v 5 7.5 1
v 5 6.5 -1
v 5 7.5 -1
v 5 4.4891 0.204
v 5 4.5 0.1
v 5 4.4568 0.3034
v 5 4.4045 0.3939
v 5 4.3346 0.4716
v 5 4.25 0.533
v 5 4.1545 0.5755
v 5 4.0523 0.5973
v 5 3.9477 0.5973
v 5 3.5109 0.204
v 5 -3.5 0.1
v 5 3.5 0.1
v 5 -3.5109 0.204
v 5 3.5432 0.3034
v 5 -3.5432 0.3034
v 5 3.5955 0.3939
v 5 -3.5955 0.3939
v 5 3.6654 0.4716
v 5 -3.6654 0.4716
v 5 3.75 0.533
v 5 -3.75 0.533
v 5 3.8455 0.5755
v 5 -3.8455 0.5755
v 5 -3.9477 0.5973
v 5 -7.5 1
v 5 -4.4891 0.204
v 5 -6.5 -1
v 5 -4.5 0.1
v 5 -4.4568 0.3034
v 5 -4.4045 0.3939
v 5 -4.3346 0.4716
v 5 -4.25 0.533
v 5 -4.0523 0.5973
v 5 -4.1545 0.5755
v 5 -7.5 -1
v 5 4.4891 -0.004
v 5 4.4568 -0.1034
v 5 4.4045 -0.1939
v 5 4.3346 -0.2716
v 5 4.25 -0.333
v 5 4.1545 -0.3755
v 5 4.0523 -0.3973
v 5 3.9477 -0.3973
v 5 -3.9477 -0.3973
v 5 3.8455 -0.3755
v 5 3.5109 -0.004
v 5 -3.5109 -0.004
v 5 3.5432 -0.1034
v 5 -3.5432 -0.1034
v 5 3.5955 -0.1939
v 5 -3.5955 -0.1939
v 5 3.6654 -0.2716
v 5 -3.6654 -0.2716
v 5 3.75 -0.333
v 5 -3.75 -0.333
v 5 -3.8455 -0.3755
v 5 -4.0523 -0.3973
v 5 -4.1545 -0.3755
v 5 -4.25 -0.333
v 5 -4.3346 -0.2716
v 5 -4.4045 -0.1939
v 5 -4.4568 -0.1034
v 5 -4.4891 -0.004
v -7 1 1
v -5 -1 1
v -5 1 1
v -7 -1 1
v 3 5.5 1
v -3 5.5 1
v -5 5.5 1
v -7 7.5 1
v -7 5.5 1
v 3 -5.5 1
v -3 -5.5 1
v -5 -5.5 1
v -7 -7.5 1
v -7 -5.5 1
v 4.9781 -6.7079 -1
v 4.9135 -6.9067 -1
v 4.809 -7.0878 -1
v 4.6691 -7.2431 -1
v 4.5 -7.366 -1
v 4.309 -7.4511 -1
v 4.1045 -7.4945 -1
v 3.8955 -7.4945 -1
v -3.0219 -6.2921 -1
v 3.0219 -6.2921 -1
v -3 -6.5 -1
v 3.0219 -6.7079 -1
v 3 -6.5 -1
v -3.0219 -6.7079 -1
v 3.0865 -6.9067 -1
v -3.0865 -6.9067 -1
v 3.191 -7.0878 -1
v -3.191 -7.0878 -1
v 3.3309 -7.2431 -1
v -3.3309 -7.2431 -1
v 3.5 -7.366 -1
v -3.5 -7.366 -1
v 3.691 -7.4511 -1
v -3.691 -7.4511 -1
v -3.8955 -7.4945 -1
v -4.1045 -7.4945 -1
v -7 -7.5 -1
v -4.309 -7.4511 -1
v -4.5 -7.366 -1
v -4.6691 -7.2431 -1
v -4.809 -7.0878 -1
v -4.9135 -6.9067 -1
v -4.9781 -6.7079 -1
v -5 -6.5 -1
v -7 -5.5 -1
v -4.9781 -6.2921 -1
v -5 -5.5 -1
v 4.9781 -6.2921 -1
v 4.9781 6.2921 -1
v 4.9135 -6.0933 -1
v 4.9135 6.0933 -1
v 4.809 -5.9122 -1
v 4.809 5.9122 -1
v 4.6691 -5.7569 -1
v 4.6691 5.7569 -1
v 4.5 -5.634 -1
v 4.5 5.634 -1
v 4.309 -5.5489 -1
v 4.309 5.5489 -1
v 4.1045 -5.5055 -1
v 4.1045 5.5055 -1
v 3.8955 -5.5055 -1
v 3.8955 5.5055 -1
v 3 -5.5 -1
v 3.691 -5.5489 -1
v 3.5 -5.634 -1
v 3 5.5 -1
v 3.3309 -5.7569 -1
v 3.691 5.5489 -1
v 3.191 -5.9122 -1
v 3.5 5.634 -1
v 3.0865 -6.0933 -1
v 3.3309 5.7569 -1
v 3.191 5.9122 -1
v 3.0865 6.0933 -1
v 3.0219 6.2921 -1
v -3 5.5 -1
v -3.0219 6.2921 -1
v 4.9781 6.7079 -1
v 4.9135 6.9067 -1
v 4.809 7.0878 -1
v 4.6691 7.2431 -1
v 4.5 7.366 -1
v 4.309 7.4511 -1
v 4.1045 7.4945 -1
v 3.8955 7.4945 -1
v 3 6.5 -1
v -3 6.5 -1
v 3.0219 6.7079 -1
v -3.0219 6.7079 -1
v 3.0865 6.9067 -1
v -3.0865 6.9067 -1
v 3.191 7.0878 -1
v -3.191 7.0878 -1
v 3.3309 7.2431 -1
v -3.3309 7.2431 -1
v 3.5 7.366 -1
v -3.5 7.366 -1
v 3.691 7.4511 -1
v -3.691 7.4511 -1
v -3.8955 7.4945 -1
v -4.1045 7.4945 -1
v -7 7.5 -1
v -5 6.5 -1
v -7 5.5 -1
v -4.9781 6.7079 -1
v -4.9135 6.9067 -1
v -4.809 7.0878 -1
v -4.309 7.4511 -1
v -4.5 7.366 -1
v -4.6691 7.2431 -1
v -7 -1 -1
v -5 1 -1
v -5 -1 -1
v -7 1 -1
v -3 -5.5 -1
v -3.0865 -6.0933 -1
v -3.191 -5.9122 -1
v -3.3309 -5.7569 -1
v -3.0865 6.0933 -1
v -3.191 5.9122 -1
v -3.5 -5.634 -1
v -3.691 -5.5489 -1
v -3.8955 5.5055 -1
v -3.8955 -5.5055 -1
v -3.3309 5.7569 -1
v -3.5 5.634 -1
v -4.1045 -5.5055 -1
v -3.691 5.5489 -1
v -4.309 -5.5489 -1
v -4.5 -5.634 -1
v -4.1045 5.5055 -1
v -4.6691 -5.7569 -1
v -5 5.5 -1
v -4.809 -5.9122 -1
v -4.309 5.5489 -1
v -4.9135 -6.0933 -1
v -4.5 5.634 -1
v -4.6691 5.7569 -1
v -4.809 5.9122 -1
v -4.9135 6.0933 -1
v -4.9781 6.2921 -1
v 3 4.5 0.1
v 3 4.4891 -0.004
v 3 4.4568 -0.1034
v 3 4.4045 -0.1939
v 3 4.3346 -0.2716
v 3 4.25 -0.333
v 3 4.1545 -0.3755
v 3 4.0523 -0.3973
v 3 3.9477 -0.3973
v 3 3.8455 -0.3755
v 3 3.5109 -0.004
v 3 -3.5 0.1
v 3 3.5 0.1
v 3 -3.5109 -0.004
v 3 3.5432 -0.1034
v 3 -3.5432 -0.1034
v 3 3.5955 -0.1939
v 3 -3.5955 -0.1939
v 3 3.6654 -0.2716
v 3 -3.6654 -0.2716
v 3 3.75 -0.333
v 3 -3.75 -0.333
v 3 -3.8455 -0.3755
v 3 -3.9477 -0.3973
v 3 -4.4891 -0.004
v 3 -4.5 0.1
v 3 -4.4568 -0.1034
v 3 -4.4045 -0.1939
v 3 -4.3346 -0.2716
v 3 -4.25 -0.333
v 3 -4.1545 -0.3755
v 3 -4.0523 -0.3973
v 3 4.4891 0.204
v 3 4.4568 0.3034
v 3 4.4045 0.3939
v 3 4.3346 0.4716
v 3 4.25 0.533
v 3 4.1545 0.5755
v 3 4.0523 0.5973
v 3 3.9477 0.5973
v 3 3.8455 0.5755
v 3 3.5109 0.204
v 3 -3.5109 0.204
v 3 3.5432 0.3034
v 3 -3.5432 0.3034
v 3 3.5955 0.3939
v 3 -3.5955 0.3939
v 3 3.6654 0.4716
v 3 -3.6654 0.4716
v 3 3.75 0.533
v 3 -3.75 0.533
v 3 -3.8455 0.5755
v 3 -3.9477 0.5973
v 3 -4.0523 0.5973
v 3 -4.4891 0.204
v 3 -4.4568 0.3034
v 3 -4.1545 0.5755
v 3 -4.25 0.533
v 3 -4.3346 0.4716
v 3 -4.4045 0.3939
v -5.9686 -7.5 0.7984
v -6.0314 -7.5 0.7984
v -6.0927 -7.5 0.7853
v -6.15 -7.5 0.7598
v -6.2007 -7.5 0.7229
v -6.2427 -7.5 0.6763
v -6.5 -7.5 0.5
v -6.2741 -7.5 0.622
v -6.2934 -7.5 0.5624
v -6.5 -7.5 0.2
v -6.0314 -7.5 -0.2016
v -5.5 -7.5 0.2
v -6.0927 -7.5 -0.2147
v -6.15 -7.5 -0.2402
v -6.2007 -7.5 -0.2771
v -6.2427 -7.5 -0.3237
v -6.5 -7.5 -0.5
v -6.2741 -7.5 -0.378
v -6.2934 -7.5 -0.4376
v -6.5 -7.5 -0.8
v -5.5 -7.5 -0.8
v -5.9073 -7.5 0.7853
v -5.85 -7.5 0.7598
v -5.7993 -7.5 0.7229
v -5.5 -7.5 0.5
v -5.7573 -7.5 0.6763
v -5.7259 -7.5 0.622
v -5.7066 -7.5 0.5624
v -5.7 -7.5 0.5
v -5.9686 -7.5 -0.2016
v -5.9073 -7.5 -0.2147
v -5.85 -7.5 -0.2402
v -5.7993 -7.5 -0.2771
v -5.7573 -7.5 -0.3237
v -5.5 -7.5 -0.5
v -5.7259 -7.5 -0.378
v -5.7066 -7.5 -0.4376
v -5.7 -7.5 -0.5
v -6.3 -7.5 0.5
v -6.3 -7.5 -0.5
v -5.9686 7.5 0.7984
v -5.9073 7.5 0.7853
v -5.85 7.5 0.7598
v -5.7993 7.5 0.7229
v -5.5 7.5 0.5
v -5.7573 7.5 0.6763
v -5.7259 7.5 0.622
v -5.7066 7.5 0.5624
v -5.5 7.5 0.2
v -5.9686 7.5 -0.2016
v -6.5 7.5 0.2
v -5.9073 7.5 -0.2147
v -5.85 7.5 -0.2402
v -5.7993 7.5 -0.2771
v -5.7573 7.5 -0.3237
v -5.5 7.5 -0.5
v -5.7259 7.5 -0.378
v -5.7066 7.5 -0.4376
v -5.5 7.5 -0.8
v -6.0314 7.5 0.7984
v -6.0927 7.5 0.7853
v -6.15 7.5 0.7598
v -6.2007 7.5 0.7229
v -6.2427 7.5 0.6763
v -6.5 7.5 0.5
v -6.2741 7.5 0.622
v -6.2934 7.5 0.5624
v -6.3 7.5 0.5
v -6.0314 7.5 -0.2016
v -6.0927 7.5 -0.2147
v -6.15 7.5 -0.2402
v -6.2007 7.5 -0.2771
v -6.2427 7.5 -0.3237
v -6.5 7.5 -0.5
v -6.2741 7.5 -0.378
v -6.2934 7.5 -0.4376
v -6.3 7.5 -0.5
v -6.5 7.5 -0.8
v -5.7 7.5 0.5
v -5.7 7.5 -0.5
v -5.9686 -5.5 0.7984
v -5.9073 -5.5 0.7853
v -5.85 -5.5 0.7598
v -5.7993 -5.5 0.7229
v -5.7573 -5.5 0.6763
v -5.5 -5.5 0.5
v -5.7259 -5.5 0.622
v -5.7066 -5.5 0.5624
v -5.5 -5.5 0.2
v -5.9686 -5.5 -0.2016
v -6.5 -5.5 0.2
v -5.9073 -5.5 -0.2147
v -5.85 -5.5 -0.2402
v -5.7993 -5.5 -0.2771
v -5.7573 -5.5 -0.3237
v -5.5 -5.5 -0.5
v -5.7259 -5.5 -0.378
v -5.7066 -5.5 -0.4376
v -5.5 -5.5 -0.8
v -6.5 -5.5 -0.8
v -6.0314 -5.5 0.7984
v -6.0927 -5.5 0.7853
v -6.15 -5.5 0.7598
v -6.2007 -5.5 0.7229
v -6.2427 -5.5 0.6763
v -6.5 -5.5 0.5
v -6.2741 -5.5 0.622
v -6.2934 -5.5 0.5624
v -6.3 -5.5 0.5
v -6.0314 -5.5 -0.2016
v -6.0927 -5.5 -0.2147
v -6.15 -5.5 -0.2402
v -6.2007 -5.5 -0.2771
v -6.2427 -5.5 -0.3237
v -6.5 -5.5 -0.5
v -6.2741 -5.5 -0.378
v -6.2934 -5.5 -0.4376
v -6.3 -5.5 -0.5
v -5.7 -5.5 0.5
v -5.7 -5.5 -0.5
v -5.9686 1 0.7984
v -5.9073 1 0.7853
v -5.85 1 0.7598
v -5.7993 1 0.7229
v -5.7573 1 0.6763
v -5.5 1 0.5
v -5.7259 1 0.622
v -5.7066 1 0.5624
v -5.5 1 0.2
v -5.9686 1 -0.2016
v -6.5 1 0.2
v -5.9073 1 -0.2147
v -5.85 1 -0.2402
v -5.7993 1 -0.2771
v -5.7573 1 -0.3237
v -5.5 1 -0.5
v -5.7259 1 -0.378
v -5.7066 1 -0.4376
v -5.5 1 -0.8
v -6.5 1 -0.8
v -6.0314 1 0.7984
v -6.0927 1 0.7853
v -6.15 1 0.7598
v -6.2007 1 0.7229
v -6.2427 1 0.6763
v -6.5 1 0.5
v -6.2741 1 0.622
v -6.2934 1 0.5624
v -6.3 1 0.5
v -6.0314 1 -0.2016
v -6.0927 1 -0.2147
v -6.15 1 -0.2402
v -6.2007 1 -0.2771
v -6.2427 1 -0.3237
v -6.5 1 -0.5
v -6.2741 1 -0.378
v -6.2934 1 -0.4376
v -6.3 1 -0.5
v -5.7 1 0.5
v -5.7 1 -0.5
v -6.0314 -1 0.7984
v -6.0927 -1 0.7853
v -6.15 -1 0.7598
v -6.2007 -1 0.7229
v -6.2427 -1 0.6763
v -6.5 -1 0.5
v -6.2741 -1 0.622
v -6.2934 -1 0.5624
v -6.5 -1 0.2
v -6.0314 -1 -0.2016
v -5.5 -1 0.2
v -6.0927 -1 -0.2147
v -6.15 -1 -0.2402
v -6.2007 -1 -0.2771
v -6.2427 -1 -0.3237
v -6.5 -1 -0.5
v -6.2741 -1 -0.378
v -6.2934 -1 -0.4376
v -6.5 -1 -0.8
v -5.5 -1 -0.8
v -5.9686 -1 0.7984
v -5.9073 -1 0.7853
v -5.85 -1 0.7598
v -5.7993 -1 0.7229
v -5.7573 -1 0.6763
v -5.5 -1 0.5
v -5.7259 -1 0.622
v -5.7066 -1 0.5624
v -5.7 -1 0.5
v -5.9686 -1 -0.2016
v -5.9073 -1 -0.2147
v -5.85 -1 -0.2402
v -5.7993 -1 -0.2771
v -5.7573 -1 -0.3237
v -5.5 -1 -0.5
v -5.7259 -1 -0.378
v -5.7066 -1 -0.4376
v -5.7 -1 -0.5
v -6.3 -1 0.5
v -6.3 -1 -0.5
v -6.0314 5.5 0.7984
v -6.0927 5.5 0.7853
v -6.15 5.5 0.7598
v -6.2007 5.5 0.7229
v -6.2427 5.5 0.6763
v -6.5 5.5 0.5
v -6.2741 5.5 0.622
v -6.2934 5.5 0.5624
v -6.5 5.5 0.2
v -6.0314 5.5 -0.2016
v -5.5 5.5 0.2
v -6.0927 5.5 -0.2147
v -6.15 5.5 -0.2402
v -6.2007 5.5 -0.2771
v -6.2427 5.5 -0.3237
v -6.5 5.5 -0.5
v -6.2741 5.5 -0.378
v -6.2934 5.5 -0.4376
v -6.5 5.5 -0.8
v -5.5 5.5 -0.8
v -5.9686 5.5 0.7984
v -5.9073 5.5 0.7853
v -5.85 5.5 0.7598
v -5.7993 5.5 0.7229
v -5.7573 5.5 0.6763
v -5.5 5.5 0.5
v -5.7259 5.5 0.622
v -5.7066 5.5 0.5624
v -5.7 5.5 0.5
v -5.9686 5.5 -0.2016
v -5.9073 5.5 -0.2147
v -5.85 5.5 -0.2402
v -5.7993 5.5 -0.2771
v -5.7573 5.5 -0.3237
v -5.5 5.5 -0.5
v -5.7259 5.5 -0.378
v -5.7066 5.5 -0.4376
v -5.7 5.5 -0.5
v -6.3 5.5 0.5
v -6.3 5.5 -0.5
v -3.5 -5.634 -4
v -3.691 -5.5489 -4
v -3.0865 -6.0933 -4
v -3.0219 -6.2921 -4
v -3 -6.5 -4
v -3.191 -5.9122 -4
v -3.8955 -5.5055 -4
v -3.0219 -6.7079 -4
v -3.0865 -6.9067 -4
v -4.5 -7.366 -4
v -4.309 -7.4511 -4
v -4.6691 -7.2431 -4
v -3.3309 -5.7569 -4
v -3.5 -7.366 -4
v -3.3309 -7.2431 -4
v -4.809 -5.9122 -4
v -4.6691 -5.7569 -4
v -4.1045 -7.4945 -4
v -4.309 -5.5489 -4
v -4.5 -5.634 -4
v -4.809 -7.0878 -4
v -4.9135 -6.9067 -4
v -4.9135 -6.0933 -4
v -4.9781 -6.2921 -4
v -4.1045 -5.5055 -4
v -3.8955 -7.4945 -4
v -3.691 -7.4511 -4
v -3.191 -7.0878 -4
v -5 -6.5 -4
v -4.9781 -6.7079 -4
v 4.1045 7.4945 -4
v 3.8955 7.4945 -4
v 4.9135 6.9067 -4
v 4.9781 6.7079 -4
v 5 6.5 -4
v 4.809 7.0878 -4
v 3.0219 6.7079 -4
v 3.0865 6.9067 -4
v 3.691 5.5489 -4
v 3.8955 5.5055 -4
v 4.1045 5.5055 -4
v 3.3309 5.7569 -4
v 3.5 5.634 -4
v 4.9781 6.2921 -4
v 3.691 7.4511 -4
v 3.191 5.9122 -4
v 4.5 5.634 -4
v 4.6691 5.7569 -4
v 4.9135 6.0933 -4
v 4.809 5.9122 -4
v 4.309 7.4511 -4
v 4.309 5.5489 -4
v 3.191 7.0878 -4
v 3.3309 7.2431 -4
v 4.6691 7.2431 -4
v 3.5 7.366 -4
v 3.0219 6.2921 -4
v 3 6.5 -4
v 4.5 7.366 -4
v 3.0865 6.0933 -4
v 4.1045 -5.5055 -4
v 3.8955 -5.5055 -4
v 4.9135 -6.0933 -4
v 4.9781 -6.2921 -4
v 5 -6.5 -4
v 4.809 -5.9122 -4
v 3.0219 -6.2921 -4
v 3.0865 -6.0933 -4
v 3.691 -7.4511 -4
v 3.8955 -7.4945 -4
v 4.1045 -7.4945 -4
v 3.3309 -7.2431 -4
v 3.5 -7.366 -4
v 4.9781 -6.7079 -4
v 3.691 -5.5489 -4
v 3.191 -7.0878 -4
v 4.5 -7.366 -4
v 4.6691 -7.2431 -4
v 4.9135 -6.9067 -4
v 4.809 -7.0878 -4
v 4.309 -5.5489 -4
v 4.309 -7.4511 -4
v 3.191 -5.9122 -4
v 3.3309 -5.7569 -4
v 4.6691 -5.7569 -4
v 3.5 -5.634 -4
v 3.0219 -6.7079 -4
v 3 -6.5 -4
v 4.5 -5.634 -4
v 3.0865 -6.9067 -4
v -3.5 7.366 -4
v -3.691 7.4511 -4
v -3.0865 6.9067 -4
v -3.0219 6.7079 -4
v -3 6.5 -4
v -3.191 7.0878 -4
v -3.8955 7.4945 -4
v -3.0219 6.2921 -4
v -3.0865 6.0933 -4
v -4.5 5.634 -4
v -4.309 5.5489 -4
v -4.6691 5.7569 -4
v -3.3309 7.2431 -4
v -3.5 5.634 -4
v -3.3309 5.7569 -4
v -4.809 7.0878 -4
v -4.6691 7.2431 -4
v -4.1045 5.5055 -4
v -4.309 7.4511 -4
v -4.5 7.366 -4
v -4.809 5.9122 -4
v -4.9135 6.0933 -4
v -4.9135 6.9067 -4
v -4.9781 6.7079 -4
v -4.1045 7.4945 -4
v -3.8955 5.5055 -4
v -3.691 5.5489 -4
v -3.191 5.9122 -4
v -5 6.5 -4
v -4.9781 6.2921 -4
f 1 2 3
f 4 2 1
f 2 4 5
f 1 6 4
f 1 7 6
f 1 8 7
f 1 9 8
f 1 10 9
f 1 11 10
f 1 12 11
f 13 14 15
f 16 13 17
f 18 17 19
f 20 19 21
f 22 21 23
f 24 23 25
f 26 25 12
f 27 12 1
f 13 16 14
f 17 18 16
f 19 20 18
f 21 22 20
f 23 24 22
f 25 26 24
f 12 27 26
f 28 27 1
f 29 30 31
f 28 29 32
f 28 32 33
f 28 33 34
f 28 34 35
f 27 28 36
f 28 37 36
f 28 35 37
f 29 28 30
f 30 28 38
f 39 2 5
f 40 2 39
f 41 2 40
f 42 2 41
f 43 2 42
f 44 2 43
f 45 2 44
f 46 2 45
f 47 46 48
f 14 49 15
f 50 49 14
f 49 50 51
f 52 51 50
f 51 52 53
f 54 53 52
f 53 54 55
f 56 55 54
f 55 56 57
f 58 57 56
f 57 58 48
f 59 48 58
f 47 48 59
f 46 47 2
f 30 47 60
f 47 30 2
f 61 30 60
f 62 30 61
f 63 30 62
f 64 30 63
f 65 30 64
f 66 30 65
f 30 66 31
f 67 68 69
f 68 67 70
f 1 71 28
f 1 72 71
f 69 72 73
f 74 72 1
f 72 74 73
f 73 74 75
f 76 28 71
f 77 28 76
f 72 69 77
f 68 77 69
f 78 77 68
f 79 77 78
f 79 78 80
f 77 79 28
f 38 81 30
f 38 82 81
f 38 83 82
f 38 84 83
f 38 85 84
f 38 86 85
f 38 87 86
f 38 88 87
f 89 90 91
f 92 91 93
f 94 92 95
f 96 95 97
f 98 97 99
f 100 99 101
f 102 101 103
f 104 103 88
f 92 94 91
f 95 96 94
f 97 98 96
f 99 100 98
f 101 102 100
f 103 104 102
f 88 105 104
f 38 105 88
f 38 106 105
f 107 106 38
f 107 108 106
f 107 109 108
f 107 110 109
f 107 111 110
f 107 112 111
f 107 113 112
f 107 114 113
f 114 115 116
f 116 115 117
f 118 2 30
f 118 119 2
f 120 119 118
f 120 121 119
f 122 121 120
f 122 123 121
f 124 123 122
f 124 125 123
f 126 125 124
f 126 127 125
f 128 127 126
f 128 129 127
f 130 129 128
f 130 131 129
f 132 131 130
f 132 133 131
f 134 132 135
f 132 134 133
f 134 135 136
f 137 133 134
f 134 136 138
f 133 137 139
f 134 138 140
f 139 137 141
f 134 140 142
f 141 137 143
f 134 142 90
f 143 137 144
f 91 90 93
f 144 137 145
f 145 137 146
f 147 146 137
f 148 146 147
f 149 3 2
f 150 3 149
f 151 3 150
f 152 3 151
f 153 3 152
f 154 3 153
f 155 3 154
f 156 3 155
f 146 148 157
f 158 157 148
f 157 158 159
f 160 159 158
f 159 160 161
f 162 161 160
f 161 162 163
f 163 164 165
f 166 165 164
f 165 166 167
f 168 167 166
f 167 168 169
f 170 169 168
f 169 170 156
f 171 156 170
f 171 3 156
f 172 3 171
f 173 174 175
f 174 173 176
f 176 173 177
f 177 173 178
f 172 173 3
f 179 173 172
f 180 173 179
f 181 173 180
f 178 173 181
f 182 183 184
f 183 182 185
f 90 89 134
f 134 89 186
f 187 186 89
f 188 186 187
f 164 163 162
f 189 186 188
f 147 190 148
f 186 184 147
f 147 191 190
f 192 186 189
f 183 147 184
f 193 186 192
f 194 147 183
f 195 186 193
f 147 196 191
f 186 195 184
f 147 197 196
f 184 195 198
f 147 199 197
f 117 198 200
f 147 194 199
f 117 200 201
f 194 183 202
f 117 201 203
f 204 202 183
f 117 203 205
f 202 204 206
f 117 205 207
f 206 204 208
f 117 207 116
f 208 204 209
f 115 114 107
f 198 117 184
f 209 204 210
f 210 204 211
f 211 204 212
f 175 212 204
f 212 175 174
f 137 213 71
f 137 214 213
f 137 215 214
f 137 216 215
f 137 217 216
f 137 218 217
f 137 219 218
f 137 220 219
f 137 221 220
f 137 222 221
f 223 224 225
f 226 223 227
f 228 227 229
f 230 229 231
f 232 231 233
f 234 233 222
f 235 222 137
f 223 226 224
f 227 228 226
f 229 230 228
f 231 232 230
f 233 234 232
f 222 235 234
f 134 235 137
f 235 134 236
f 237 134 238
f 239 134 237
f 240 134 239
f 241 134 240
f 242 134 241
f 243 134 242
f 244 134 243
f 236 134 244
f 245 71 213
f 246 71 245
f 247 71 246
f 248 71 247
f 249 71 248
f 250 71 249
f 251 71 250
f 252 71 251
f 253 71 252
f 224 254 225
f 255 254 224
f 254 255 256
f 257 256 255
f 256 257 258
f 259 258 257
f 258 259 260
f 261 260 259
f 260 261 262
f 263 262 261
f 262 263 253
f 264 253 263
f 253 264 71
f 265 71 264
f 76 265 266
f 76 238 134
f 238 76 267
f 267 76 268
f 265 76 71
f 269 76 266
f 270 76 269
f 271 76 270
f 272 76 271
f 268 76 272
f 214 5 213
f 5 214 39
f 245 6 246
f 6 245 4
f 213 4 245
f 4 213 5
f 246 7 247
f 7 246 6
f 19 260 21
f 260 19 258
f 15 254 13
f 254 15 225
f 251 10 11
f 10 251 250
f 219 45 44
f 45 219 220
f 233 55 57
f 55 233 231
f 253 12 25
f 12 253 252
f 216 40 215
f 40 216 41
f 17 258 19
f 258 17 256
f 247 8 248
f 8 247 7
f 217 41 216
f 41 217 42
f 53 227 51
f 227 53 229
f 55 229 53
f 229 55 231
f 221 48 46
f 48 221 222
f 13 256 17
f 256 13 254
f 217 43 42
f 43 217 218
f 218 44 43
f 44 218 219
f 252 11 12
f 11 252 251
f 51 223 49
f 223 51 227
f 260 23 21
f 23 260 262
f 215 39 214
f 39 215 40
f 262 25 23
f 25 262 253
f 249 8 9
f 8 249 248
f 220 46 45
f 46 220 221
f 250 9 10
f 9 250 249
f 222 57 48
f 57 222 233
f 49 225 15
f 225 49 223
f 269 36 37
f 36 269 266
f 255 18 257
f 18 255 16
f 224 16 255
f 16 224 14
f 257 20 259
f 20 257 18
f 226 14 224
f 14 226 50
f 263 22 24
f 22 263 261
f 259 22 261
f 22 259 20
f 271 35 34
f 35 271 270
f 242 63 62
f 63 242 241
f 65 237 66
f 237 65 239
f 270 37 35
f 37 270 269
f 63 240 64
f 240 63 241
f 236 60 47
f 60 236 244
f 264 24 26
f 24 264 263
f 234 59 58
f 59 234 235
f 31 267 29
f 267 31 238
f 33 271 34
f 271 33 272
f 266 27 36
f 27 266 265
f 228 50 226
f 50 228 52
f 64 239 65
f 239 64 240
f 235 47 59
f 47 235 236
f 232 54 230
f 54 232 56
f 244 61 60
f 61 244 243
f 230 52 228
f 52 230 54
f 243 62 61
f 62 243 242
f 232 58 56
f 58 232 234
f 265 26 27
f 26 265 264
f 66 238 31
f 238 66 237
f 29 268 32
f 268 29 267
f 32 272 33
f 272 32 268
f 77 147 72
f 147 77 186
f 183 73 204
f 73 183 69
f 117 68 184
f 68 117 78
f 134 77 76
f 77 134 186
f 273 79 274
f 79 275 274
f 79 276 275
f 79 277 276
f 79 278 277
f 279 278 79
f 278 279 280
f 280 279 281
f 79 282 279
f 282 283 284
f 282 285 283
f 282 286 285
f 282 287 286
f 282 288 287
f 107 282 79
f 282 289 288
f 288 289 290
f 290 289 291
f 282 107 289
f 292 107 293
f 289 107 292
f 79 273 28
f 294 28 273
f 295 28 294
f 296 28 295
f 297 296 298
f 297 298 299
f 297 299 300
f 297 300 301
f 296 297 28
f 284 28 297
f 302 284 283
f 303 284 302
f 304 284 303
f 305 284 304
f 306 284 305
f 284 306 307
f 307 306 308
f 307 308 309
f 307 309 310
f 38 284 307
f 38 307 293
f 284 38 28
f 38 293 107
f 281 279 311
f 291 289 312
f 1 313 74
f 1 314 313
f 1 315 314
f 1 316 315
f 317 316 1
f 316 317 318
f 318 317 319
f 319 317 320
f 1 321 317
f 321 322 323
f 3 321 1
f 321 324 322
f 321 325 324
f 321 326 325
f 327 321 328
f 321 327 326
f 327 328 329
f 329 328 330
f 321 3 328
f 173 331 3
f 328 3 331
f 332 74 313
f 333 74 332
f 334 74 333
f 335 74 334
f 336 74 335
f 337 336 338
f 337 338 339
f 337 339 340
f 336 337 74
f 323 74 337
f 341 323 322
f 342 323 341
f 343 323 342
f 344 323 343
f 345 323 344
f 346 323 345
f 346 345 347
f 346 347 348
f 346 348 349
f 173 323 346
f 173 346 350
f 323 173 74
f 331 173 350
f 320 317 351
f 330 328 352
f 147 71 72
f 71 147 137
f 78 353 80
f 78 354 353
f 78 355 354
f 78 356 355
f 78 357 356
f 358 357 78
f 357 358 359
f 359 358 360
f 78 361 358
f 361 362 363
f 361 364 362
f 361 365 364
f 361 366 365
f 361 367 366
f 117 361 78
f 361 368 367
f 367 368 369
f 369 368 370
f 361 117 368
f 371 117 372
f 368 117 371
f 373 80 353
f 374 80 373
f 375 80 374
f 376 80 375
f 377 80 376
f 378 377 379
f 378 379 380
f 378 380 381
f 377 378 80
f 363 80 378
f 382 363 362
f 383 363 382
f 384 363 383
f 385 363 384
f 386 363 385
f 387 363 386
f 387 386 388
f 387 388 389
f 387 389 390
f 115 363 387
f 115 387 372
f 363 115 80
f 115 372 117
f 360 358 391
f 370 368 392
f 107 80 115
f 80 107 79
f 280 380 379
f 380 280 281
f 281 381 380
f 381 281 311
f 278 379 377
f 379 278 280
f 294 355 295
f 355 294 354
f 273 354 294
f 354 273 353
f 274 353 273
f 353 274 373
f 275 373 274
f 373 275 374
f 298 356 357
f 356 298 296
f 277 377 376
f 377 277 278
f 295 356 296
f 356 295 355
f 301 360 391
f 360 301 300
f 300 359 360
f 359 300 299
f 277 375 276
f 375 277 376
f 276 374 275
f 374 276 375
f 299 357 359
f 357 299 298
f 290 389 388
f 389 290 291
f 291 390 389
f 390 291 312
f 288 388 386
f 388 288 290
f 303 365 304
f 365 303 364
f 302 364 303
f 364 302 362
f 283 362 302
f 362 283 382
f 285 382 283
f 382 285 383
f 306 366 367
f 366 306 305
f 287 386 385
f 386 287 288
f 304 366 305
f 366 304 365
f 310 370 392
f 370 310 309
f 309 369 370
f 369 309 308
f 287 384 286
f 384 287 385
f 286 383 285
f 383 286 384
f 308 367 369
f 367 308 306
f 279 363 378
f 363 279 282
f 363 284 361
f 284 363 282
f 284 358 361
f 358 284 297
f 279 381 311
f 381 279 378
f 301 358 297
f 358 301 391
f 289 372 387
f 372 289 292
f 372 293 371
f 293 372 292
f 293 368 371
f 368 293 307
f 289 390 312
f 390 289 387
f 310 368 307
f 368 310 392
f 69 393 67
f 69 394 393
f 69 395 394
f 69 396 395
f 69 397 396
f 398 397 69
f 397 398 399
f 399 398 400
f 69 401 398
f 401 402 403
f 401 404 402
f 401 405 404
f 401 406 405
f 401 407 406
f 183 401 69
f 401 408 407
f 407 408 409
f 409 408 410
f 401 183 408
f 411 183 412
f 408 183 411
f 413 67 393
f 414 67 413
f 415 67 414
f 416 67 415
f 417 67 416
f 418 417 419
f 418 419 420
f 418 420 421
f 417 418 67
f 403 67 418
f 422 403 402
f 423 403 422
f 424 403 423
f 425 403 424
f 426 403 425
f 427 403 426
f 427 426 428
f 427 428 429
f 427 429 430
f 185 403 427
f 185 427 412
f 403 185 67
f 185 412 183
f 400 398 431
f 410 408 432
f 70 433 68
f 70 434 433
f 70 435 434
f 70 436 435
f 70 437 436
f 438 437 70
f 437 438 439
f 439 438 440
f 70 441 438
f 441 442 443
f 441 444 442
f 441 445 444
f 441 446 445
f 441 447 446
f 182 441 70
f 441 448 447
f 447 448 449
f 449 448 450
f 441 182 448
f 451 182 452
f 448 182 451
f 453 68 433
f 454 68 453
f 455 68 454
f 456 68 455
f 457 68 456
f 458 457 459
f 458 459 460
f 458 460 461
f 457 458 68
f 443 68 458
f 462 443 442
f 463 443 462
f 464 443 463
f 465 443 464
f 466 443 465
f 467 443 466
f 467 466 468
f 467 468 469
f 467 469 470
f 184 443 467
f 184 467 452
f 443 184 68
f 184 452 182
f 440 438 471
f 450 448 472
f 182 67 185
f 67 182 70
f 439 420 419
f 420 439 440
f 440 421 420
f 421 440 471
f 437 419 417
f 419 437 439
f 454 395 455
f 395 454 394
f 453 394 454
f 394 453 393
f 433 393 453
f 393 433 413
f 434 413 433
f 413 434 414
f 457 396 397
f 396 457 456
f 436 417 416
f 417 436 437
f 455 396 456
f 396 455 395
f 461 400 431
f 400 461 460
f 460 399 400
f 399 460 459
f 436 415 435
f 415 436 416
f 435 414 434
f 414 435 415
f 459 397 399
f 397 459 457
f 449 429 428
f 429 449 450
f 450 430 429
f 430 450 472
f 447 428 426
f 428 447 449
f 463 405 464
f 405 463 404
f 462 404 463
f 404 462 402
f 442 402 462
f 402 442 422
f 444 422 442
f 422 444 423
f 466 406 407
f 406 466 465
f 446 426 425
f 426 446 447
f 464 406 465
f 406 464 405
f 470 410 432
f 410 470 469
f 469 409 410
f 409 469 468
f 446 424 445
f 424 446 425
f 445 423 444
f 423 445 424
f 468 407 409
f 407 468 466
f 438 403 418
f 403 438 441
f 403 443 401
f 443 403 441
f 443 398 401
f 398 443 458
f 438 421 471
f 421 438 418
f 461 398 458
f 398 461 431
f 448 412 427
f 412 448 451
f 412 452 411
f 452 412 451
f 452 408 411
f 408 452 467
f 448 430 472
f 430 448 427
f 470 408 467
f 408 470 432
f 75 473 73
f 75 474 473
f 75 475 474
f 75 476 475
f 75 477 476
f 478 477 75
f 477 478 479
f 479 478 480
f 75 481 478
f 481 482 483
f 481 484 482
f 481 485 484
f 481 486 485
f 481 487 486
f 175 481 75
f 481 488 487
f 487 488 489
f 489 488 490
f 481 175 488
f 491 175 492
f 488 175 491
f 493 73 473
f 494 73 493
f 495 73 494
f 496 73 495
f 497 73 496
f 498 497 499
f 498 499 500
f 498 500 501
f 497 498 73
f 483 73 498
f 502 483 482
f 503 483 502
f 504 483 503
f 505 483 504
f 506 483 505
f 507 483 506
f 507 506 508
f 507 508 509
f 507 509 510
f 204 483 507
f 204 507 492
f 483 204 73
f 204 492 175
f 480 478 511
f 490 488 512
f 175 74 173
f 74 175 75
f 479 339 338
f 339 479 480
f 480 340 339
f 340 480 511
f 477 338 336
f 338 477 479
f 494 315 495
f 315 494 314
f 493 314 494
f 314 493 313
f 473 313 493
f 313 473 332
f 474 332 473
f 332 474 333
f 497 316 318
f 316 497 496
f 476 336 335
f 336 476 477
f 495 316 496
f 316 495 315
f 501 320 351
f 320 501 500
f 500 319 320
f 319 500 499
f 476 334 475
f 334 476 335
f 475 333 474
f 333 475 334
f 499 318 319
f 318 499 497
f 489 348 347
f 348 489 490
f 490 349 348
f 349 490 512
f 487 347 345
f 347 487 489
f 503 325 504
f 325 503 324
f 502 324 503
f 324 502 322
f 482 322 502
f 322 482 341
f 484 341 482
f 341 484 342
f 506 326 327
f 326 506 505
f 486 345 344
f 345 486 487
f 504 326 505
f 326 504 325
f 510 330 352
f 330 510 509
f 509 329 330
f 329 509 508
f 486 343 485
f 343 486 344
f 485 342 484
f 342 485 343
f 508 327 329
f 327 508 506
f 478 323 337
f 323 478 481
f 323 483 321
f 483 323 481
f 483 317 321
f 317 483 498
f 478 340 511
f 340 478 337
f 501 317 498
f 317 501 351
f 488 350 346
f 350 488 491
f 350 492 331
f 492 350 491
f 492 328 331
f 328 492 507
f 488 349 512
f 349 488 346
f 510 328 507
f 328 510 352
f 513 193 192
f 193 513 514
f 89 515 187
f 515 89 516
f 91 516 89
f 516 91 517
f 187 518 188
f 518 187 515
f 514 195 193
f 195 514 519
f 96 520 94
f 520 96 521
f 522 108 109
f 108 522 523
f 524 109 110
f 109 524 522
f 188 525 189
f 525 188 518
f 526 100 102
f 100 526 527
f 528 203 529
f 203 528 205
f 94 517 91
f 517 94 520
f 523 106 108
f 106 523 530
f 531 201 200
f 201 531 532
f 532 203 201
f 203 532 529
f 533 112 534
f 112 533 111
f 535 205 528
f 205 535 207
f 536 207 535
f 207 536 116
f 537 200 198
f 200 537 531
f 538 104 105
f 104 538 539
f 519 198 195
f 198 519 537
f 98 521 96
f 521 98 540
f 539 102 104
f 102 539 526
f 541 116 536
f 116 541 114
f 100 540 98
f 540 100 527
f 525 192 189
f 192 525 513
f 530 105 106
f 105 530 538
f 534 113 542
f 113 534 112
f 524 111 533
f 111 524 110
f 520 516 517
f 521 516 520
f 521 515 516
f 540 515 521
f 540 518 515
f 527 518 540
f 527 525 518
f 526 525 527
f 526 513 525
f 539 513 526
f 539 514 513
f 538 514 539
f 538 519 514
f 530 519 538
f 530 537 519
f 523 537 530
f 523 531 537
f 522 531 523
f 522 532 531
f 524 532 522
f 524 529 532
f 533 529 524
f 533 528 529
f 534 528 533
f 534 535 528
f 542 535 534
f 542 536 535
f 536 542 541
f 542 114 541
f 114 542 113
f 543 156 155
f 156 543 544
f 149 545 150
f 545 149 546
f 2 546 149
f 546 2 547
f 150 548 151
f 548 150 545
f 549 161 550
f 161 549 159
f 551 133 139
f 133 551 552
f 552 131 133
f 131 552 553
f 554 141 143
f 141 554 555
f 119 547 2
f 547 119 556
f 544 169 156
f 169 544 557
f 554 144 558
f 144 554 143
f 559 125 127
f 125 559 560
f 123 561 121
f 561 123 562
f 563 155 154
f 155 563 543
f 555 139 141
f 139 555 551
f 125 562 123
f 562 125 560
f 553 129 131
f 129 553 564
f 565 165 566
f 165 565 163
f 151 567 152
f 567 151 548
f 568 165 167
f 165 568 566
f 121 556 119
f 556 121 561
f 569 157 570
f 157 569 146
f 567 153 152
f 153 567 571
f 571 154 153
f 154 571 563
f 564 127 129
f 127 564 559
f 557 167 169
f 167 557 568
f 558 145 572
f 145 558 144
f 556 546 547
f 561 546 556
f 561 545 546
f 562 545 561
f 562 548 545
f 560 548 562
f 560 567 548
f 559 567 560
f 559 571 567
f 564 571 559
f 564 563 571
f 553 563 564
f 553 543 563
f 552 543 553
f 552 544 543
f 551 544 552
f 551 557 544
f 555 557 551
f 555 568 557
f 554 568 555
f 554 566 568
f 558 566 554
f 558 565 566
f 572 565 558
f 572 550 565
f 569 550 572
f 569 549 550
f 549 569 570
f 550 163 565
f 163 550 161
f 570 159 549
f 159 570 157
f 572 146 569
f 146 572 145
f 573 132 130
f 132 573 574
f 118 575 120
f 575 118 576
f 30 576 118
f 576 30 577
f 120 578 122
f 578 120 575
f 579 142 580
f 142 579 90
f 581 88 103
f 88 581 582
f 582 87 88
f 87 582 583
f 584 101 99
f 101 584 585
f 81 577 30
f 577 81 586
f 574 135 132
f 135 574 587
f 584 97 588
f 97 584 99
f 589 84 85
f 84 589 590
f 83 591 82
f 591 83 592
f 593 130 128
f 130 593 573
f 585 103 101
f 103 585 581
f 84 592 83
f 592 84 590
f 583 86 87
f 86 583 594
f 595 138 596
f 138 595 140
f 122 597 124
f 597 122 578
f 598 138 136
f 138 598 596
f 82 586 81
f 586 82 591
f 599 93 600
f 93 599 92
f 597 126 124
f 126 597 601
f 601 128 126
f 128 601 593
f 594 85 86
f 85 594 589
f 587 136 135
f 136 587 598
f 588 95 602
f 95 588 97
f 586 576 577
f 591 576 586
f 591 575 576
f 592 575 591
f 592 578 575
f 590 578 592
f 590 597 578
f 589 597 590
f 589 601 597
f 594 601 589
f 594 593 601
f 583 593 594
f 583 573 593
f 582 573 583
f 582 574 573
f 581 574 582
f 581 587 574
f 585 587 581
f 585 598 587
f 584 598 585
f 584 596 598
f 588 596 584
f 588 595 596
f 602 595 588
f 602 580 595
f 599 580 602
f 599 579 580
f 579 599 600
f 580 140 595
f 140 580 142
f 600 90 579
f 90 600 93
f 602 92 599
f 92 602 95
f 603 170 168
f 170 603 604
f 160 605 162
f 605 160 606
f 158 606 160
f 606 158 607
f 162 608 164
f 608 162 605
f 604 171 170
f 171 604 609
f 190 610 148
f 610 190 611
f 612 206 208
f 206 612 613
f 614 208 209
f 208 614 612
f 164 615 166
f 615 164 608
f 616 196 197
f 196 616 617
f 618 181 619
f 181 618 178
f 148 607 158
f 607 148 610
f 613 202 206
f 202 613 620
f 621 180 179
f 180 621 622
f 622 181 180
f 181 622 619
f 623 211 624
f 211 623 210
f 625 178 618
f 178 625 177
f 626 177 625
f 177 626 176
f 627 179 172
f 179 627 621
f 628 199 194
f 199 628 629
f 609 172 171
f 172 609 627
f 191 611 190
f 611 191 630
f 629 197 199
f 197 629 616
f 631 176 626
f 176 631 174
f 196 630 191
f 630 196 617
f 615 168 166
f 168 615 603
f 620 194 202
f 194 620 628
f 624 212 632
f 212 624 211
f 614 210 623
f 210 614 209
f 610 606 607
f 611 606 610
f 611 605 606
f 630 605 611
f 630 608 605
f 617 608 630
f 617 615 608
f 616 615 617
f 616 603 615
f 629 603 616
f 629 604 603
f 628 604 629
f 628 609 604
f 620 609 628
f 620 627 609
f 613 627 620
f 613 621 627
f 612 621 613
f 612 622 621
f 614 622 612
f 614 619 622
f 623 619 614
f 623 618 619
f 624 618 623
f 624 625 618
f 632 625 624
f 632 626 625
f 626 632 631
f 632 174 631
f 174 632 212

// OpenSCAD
//embout pour connecter au cadre du milieu(sur le côté droite) avec trois cube(sur le côté gauche) 
//End piece to connect the middle (right side) 3 cubes (left side)
//côté droite longeur avec deux trou extrême droite et droite
//right side with 2 holes far right and right
union () 					{
difference()	{
translate([4,0,0]) {
cube(size=[2,13,2],center=true);
						 }
rotate(a=120,v=[1,1,1])translate([4,0.1,3])cylinder(r=0.5,h=3);
				
rotate(a=120,v=[1,1,1])translate([-4,0.1,3])cylinder(r=0.5,h=3);			
	}
//côté gauche longeur
//left side length 
translate([-4,0,0]){								
cube(size=[2,13,2], center=true);
		}		

//largeur (vers l'avant)
//widht (towards the front)
translate([0,-6.5,0]){
cube(size=[10,2,2],center=true);
		}

// largeur (vers l'arrière)
//widht (back)
translate([0,6.5,0]){
cube(size=[10,2,2],center=true);
		}

								}

// Jambe gauche
// left leg
$fn=30;
translate([-4,-6.5,-4]){
cylinder(h=3,l=10);
		}

//Jambe extrême droite
// far right leg
$fn=30;
translate([4,6.5,-4]){
cylinder(h=3,l=10);
		}

//Jambe droite
//right leg
$fn=30;
translate([4,-6.5,-4]){
cylinder(h=3,l=10);
		}

// Jambe extrême gauche
//far left leg 
$fn=30;
translate([-4,6.5,-4]){
cylinder(h=3,l=10);
		}

// Cube (gauche) avec trou(en haut et en bas) pour faire entre les clés 
// left cube with hole (top and bottom) to fit in sticks
union()											{
rotate (a=450,v=[0,0,1])translate([2.5,20,0])					{
translate([-10,-15,-1]){
difference () 					{
cube(size=[2,2,2]);
rotate(a=120,v=[1,1,1])translate([1,1.5,-0.5])cylinder(r=0.3,h=3);	
rotate(a=120,v=[1,1,1])translate([1,0.5,-0.5])cylinder(r=0.3,h=3);
rotate(a=270,v=[5,0,0])translate([-1.5,-1.5,0.5])cube(size=[3.5,0.3,1.0]);
rotate(a=270,v=[5,0,0])translate([-1,-0.5,0.5])cube(size=[3.1,0.3,1.0]);
						}
				
									}


															       }	

// Cube (gauche milieu) avec trou (en haut et en bas) pour faire entre les clés
// left middle cube with hole (top and bottom) to fit in sticks
rotate (a=450,v=[0,0,1])translate([-9,22,0])					{	
translate([8,-17,-1]){
difference () 					   {
cube(size=[2,2,2]);
rotate(a=120,v=[1,1,1])translate([1,1.5,-0.5])cylinder(r=0.3,h=3);	
rotate(a=120,v=[1,1,1])translate([1,0.5,-0.5])cylinder(r=0.3,h=3);
rotate(a=270,v=[5,0,0])translate([-1.5,-1.5,0.5])cube(size=[3.5,0.3,1.0]);
rotate(a=270,v=[5,0,0])translate([-1,-0.5,0.5])cube(size=[3.1,0.3,1.0]);
						}
				
									}					
																}


//Cube (gauche extrême) avec un trou (en haut et en bas) pour faire entre les clés 
//Cube far left with hole (top and bottom) to fit in sticks
rotate (a=450,v=[0,0,1])translate([-2.5,-10,0])			{	
translate([8,15,-1]){
difference () 				       {
cube(size=[2,2,2]);
rotate(a=120,v=[1,1,1])translate([1,1.5,-0.5])cylinder(r=0.3,h=3);	
rotate(a=120,v=[1,1,1])translate([1,0.5,-0.5])cylinder(r=0.3,h=3);
rotate(a=270,v=[5,0,0])translate([-1.5,-1.5,0.5])cube(size=[3.5,0.3,1.0]);
rotate(a=270,v=[5,0,0])translate([-1,-0.5,0.5])cube(size=[3.1,0.3,1.0]);
					}
				
									}	 					 }

						
				
									
						
												}
									


															       
						

														



